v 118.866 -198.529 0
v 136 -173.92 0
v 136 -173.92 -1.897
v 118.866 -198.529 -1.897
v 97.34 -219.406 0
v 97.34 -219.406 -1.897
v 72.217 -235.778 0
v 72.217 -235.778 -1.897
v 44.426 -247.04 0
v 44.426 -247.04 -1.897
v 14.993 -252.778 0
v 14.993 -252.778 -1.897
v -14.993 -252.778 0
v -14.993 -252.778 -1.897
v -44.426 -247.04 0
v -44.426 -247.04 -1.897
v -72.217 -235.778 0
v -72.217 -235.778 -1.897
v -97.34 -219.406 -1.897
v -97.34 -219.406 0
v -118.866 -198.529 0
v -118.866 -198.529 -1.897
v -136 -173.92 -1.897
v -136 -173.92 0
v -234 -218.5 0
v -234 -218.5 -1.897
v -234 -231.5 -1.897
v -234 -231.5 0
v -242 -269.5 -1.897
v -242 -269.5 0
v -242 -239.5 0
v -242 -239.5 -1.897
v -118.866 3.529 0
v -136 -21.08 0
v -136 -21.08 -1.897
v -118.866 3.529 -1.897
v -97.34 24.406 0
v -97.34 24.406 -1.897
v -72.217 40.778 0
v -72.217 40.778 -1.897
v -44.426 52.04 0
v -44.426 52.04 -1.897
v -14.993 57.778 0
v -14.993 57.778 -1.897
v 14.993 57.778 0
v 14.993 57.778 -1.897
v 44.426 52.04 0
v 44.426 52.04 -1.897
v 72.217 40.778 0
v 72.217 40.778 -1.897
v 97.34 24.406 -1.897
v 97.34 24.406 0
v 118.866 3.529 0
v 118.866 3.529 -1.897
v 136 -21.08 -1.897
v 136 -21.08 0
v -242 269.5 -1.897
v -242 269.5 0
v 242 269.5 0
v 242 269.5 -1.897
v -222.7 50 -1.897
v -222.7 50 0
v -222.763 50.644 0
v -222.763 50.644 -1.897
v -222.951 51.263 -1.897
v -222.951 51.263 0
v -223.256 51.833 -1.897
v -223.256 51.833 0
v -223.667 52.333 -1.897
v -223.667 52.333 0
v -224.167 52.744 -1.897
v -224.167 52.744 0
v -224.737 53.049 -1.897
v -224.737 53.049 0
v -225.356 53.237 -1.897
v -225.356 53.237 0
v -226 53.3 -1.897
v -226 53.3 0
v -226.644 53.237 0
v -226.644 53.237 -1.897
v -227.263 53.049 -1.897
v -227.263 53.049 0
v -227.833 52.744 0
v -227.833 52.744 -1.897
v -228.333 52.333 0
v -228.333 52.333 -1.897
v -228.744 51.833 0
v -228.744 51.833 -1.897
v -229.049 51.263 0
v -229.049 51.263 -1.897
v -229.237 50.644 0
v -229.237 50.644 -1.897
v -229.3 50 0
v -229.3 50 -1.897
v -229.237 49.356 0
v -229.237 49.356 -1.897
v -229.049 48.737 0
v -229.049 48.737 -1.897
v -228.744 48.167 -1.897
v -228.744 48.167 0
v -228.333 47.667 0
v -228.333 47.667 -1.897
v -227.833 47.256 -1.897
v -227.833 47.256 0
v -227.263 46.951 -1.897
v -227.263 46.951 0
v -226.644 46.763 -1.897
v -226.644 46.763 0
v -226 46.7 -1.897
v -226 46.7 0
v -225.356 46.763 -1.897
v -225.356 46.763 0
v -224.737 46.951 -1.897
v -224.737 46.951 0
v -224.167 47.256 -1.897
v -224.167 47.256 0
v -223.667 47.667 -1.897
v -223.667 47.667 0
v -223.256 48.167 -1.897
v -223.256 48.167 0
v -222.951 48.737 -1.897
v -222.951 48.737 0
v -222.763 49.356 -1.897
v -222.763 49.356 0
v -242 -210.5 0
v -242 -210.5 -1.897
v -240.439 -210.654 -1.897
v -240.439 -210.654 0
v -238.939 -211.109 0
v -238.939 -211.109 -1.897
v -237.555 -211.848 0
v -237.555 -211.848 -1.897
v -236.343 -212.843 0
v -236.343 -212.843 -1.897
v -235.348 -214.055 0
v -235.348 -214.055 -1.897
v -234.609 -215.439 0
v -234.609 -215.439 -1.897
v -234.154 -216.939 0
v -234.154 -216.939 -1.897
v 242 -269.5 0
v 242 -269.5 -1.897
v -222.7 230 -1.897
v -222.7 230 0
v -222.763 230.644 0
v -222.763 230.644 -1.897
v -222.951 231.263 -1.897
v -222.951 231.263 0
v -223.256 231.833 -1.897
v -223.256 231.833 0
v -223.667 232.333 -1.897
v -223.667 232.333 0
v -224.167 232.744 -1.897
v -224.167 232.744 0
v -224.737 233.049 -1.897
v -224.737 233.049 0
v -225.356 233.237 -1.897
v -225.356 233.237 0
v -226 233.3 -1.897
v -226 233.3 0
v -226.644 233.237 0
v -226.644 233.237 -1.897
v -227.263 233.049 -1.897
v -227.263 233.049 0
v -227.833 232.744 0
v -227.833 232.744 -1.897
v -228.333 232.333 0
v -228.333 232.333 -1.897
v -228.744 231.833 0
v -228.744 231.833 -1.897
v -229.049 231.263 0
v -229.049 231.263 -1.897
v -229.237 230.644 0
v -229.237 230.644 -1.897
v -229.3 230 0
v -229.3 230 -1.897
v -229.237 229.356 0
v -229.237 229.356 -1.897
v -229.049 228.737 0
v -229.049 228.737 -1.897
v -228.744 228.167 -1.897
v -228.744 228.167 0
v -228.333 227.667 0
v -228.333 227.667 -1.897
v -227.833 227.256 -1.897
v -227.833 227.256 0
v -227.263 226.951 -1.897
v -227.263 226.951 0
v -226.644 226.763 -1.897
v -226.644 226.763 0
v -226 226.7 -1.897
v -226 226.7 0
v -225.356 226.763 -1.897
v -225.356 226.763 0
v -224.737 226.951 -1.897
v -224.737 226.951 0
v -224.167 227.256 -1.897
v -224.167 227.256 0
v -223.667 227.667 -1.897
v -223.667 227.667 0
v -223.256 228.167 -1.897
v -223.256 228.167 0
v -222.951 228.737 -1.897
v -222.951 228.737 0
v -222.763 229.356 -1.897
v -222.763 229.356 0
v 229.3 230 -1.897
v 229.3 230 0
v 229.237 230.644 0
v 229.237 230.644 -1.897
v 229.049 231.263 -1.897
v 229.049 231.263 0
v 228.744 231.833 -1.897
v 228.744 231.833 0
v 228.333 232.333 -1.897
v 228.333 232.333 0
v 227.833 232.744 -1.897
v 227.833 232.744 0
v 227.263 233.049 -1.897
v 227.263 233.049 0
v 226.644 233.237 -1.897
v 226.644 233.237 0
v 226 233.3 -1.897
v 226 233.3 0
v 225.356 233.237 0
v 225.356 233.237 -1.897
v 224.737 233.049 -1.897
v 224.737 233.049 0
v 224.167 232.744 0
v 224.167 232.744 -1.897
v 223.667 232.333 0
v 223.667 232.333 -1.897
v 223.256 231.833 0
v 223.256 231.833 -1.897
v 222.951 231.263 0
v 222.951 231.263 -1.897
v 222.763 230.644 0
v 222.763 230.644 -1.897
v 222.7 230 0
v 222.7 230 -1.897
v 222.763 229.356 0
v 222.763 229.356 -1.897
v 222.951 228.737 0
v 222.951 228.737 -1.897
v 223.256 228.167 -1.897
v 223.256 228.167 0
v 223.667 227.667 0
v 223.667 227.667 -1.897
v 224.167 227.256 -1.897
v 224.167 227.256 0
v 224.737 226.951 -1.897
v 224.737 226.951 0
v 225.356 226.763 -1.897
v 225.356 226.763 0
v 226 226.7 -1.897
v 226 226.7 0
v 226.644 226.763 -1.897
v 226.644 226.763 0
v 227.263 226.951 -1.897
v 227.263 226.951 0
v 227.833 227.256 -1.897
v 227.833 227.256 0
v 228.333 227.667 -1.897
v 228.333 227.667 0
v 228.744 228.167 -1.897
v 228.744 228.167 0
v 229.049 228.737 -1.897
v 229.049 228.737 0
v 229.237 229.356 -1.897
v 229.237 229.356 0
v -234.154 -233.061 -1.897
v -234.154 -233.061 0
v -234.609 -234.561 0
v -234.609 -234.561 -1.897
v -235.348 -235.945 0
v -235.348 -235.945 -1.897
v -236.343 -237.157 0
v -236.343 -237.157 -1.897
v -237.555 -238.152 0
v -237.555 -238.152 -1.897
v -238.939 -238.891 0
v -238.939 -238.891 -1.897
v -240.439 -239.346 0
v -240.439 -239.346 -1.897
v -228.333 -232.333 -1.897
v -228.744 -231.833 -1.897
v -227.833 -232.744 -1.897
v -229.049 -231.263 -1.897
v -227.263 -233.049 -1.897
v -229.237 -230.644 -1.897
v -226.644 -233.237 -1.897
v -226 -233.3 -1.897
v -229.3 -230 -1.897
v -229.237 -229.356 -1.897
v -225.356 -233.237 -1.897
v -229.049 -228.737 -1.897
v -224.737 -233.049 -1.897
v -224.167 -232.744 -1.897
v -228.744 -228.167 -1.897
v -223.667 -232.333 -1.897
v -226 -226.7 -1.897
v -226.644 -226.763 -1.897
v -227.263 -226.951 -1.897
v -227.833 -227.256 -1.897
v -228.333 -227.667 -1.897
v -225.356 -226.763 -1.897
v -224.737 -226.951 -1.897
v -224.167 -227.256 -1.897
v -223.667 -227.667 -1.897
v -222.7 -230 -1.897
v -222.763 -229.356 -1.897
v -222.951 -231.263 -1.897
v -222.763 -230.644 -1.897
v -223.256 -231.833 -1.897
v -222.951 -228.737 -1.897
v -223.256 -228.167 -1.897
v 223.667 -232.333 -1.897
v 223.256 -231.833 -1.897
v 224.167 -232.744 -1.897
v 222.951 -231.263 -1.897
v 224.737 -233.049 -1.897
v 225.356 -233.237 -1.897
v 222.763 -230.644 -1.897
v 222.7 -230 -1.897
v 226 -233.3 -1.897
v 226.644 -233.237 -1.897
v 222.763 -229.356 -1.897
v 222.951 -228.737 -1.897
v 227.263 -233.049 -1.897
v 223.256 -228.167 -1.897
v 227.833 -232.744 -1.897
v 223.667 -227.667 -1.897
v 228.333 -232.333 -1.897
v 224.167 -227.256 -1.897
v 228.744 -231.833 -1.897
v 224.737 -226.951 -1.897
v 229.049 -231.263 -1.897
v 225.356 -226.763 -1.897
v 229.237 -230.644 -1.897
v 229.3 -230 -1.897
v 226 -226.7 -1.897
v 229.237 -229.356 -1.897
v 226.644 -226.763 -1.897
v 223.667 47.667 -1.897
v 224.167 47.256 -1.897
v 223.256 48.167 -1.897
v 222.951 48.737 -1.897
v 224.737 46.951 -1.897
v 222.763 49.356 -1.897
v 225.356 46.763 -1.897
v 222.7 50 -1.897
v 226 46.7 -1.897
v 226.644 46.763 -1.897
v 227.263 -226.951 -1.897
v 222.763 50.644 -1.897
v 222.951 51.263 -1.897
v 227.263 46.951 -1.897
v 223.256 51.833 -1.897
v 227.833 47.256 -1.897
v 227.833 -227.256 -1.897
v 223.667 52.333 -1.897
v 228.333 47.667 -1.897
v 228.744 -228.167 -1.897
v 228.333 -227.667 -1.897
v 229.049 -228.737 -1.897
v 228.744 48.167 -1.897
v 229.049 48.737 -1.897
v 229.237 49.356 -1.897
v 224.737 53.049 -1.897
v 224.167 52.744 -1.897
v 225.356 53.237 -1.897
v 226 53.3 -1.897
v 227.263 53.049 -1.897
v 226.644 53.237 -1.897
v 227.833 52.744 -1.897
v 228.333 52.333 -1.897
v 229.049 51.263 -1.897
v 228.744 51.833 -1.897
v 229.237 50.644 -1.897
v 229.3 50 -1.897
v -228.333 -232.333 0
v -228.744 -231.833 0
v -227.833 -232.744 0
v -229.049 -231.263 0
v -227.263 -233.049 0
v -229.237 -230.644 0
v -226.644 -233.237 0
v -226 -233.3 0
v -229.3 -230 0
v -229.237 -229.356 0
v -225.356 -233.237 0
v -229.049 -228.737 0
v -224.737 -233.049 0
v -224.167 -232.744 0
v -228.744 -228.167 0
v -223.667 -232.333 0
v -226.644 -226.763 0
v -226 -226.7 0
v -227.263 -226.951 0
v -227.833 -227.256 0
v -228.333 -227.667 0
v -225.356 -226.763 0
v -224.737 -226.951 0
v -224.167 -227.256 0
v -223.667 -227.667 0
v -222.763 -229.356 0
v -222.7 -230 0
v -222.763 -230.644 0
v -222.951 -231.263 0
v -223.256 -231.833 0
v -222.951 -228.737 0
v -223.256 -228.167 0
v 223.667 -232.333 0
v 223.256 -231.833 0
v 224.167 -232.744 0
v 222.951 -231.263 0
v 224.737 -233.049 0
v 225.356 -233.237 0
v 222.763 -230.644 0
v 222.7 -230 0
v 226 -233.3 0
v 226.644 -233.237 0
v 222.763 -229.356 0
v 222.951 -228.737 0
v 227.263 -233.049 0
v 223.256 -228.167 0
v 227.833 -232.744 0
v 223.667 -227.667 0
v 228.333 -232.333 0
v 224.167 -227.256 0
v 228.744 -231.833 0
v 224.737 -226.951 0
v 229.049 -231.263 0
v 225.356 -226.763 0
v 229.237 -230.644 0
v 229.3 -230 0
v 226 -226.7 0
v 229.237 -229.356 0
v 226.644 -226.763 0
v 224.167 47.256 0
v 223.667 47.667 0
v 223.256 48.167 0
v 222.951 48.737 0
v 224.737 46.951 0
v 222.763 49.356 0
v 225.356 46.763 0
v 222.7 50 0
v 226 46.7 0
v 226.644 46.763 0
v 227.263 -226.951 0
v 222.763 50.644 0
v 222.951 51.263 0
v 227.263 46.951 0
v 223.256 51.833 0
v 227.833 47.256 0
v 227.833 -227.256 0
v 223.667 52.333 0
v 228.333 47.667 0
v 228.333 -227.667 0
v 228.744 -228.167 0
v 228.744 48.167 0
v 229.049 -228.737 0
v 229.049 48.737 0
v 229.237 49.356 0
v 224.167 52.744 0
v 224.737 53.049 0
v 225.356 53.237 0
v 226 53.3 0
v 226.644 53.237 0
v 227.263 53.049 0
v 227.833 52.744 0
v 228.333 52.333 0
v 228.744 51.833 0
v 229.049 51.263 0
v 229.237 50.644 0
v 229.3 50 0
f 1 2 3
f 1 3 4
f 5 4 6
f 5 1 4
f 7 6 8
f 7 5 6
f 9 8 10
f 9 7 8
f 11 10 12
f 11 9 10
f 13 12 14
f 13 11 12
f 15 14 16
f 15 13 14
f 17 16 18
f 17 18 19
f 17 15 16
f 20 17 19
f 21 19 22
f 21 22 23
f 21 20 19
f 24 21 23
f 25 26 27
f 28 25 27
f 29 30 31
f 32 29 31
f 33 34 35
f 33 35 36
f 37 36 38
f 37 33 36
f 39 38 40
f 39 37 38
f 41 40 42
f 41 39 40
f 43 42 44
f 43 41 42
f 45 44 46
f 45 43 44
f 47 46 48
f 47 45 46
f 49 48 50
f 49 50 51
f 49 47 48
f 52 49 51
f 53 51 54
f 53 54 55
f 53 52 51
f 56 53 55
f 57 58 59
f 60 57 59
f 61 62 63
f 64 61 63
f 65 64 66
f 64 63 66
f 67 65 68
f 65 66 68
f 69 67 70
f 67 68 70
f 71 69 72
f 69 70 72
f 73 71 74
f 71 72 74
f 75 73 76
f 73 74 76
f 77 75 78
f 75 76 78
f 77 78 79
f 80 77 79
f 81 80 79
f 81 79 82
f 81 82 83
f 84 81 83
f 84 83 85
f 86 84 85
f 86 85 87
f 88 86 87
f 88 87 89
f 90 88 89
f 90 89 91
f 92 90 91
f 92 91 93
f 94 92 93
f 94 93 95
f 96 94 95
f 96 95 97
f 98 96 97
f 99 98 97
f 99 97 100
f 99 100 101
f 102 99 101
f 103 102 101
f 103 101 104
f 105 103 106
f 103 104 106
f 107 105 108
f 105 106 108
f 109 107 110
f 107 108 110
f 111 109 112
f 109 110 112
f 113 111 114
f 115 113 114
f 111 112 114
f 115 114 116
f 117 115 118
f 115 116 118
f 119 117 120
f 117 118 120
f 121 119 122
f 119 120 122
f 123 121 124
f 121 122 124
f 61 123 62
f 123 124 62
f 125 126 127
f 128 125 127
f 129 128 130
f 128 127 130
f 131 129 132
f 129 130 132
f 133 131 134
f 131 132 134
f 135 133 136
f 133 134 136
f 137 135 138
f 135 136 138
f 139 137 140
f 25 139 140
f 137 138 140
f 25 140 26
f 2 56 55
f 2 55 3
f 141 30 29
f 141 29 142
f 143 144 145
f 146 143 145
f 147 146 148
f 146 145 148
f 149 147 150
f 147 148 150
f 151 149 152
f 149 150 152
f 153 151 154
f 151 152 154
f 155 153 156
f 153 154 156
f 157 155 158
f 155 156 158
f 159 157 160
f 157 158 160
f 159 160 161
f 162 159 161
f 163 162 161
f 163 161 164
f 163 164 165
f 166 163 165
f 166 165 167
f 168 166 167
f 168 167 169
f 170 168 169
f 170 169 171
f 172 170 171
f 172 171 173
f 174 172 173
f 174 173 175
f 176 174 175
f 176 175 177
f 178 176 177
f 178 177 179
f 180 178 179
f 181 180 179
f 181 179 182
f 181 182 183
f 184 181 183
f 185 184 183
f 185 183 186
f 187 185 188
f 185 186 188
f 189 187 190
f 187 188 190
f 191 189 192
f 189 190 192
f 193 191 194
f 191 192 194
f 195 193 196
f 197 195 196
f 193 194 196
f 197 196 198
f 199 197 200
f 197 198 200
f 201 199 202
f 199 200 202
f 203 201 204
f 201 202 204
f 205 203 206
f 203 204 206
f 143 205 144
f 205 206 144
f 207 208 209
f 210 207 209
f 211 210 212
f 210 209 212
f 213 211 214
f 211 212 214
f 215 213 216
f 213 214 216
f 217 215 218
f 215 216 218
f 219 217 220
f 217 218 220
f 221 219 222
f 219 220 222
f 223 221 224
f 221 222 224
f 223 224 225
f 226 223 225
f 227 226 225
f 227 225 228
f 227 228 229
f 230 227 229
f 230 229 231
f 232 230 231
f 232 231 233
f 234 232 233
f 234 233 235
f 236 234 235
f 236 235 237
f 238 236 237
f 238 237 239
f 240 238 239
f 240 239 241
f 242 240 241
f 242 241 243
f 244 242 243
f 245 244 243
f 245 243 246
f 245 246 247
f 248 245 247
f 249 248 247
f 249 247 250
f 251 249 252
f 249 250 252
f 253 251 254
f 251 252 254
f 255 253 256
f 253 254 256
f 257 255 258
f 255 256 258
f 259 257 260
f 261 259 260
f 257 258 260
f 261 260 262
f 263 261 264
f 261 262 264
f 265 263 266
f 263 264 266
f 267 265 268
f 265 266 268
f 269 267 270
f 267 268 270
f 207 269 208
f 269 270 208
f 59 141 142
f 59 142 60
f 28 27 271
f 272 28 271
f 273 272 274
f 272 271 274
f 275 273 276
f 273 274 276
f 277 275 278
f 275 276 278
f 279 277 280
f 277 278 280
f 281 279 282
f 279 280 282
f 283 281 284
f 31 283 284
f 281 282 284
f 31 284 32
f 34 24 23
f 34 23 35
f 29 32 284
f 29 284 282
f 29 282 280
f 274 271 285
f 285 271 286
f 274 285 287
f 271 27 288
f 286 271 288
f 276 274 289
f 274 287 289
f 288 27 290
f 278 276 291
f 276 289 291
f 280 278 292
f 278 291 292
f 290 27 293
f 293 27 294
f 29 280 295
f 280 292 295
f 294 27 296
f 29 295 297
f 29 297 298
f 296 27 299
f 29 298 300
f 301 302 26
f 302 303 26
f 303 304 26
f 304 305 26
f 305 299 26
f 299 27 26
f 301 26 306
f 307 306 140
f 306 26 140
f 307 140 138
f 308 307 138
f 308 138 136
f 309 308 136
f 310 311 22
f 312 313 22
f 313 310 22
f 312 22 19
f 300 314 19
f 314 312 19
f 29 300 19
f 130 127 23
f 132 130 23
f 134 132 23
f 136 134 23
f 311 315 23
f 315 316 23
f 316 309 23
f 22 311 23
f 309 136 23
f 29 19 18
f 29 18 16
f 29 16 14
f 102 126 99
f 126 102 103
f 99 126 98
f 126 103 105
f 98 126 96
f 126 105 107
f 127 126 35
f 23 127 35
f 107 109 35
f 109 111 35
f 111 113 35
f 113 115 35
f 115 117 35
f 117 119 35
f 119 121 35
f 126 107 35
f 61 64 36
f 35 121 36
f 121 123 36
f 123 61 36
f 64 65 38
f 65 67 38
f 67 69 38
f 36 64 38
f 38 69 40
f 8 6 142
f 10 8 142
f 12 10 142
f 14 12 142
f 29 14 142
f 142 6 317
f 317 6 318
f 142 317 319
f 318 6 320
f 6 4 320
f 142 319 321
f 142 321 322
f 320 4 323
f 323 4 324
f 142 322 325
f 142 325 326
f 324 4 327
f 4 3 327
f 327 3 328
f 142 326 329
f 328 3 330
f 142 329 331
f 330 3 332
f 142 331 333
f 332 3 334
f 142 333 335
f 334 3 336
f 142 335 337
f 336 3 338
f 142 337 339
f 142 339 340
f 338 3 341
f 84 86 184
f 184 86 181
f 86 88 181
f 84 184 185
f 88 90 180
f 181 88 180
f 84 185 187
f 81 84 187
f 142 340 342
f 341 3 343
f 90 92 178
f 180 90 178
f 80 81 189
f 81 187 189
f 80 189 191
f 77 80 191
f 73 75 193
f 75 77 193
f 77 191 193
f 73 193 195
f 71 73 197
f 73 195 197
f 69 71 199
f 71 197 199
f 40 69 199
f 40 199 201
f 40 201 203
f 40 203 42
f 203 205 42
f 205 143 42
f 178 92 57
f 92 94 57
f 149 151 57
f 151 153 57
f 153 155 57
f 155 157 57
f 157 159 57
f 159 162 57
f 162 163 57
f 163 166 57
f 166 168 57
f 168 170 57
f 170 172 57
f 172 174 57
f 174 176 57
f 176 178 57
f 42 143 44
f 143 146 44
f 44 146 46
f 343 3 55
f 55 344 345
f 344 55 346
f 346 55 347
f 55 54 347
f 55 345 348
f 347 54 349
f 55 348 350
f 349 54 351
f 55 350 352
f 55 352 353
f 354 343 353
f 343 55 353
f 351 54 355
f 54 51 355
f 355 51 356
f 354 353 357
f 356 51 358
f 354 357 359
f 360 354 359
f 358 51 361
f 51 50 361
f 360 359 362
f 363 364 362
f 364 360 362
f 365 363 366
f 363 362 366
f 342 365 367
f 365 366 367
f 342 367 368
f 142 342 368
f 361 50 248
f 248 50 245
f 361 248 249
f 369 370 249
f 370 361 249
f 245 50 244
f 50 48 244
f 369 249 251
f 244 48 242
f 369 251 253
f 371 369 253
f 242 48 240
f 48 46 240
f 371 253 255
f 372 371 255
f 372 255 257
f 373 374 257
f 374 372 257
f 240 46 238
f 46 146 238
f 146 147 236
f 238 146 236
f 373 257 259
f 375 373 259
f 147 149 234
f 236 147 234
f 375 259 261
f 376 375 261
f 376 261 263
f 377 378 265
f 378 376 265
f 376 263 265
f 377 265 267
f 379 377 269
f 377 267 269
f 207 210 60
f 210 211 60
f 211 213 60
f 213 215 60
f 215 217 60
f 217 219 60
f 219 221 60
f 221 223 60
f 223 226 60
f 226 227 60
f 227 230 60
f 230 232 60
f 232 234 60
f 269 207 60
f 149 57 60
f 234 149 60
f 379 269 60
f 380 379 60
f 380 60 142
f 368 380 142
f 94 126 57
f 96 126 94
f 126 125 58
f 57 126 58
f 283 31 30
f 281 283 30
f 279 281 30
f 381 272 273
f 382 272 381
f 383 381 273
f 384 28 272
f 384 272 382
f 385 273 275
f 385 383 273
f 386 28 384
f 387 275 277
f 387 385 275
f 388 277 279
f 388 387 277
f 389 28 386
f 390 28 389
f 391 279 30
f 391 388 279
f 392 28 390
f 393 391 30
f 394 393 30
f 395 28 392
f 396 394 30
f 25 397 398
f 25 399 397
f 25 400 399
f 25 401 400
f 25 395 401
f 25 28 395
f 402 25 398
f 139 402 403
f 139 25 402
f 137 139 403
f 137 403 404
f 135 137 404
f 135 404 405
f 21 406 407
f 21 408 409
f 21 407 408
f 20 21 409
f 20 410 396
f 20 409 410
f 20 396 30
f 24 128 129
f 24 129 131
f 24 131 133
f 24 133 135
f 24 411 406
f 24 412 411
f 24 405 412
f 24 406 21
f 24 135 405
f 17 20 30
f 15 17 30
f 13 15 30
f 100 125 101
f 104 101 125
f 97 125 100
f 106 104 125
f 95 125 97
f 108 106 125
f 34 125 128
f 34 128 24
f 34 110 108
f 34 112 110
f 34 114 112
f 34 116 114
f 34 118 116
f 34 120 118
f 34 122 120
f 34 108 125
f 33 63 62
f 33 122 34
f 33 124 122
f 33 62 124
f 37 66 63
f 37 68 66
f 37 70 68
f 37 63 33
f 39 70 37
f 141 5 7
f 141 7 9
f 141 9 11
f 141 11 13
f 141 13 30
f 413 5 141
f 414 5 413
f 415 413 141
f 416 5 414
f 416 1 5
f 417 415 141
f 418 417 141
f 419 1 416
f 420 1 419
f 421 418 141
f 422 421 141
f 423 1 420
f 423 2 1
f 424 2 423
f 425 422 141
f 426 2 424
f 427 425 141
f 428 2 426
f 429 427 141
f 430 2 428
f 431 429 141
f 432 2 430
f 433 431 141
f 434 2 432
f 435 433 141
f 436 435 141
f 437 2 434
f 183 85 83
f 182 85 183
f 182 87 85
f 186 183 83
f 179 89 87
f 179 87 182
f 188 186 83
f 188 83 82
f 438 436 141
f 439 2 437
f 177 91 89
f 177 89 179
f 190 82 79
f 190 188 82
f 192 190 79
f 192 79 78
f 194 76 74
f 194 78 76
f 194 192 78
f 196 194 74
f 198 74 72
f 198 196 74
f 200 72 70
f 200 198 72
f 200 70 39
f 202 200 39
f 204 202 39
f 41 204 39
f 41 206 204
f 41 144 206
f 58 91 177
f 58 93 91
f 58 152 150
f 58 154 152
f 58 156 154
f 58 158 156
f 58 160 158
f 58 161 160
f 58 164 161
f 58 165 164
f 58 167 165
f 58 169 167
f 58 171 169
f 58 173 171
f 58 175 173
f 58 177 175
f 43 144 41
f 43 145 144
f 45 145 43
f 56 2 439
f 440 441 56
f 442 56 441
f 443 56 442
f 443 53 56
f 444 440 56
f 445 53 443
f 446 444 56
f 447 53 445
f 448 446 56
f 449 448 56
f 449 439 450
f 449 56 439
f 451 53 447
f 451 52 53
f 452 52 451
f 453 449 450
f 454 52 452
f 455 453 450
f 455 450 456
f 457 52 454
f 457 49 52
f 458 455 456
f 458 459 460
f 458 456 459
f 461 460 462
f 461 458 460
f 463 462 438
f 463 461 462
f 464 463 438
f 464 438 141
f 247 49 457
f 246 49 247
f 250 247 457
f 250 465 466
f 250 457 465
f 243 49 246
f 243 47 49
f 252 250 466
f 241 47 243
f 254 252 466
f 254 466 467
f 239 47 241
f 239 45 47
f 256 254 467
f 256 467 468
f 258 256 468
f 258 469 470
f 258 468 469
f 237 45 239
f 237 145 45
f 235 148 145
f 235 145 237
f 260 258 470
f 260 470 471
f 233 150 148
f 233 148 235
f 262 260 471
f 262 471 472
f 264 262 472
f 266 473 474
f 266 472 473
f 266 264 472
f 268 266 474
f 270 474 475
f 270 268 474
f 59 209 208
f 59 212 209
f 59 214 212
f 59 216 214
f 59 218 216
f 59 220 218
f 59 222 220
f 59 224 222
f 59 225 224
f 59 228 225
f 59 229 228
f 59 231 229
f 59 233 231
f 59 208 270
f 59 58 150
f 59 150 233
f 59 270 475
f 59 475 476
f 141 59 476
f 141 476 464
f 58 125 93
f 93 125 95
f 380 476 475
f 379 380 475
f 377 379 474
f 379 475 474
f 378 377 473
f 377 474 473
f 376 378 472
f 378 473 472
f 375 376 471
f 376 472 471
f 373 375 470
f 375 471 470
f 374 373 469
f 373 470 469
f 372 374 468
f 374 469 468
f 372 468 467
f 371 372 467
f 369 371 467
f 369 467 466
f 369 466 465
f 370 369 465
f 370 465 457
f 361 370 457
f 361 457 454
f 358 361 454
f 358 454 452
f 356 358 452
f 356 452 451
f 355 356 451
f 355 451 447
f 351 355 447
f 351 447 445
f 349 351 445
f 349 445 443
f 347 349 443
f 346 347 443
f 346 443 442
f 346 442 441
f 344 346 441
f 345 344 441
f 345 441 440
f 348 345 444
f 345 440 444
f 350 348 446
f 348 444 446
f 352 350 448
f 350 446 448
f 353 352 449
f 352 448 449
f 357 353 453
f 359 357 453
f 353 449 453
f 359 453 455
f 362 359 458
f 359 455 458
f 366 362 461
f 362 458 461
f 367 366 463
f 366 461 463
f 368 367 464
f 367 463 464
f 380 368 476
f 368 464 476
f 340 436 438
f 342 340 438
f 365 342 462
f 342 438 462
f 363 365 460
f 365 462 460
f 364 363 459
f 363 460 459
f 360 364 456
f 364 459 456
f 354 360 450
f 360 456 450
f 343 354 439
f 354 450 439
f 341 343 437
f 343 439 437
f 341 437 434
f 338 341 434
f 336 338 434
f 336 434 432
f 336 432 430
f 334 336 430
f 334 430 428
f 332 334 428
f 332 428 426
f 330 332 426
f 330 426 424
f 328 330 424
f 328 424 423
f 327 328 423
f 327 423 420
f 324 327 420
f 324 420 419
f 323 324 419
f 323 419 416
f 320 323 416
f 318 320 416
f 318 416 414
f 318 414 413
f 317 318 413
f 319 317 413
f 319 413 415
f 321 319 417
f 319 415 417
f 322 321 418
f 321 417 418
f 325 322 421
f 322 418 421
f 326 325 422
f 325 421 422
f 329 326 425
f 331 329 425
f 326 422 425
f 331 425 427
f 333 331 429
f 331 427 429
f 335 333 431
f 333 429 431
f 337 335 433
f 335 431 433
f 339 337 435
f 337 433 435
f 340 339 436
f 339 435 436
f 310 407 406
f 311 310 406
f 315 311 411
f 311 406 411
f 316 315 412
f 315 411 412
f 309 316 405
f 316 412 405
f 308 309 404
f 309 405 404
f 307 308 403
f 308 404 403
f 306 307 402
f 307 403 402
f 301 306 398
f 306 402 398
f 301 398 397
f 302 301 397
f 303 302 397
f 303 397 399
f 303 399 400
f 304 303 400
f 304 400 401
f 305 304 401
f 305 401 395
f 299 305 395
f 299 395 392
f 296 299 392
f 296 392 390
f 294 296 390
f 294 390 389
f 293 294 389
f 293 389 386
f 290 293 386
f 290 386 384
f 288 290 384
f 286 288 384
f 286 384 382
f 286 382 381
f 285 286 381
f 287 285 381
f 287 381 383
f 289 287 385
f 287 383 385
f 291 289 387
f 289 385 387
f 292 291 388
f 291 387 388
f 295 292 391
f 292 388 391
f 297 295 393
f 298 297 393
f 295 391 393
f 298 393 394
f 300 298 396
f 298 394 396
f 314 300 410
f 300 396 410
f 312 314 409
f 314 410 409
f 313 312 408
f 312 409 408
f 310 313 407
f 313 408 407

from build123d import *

# Parameters (mm, degrees)
SKETCH1_W               = 484
SKETCH1_H               = 539
BASE_FLANGE1_DEPTH      = 1.89738
M6_CLEARANCE_HOLE1_D    = 6.6
CUT_EXTRUDE1_DEPTH      = 363.212437736
CUT_EXTRUDE1_DEPTH_BACK = 363.212437736


# Sheet-metal steps are written as plain solids
with BuildPart() as part:
    # Sketch1 → Base-Flange1 (new body)
    with BuildSketch(Plane.XY):
        Rectangle(SKETCH1_W, SKETCH1_H)
        with BuildLine():
            Line((136, -21.080107302), (136, -173.919892698))
            ThreePointArc((136, -173.919892698), (0, -253.5), (-136, -173.919892698))
            Line((-136, -173.919892698), (-136, -21.080107302))
            ThreePointArc((-136, -21.080107302), (0, 58.5), (136, -21.080107302))
        make_face(mode=Mode.SUBTRACT)
    extrude(amount=-BASE_FLANGE1_DEPTH)

    # M6 Clearance Hole1 (through all)
    with Locations(Plane(origin=(0, 0, -1.89738), x_dir=(-1, 0, 0), z_dir=(0, 0, -1))):
        with Locations((-226, 230), (226, 230), (226, -230), (-226, -230), (-226, 50), (226, 50)):
            Hole(M6_CLEARANCE_HOLE1_D / 2)

    # Sketch21 → Cut-Extrude1 (cut, two sides: drawn at the far end of the back side and taken through both)
    with BuildSketch(Plane.XY.offset(-CUT_EXTRUDE1_DEPTH_BACK)):
        with BuildLine():
            Line((-234, -218.5), (-234, -231.5))
            ThreePointArc((-234, -231.5), (-236.343145751, -237.156854249), (-242, -239.5))
            Line((-242, -239.5), (-242, -210.5))
            ThreePointArc((-242, -210.5), (-236.343145751, -212.843145751), (-234, -218.5))
        make_face()
    extrude(amount=CUT_EXTRUDE1_DEPTH + CUT_EXTRUDE1_DEPTH_BACK, mode=Mode.SUBTRACT)


solid = part.part
